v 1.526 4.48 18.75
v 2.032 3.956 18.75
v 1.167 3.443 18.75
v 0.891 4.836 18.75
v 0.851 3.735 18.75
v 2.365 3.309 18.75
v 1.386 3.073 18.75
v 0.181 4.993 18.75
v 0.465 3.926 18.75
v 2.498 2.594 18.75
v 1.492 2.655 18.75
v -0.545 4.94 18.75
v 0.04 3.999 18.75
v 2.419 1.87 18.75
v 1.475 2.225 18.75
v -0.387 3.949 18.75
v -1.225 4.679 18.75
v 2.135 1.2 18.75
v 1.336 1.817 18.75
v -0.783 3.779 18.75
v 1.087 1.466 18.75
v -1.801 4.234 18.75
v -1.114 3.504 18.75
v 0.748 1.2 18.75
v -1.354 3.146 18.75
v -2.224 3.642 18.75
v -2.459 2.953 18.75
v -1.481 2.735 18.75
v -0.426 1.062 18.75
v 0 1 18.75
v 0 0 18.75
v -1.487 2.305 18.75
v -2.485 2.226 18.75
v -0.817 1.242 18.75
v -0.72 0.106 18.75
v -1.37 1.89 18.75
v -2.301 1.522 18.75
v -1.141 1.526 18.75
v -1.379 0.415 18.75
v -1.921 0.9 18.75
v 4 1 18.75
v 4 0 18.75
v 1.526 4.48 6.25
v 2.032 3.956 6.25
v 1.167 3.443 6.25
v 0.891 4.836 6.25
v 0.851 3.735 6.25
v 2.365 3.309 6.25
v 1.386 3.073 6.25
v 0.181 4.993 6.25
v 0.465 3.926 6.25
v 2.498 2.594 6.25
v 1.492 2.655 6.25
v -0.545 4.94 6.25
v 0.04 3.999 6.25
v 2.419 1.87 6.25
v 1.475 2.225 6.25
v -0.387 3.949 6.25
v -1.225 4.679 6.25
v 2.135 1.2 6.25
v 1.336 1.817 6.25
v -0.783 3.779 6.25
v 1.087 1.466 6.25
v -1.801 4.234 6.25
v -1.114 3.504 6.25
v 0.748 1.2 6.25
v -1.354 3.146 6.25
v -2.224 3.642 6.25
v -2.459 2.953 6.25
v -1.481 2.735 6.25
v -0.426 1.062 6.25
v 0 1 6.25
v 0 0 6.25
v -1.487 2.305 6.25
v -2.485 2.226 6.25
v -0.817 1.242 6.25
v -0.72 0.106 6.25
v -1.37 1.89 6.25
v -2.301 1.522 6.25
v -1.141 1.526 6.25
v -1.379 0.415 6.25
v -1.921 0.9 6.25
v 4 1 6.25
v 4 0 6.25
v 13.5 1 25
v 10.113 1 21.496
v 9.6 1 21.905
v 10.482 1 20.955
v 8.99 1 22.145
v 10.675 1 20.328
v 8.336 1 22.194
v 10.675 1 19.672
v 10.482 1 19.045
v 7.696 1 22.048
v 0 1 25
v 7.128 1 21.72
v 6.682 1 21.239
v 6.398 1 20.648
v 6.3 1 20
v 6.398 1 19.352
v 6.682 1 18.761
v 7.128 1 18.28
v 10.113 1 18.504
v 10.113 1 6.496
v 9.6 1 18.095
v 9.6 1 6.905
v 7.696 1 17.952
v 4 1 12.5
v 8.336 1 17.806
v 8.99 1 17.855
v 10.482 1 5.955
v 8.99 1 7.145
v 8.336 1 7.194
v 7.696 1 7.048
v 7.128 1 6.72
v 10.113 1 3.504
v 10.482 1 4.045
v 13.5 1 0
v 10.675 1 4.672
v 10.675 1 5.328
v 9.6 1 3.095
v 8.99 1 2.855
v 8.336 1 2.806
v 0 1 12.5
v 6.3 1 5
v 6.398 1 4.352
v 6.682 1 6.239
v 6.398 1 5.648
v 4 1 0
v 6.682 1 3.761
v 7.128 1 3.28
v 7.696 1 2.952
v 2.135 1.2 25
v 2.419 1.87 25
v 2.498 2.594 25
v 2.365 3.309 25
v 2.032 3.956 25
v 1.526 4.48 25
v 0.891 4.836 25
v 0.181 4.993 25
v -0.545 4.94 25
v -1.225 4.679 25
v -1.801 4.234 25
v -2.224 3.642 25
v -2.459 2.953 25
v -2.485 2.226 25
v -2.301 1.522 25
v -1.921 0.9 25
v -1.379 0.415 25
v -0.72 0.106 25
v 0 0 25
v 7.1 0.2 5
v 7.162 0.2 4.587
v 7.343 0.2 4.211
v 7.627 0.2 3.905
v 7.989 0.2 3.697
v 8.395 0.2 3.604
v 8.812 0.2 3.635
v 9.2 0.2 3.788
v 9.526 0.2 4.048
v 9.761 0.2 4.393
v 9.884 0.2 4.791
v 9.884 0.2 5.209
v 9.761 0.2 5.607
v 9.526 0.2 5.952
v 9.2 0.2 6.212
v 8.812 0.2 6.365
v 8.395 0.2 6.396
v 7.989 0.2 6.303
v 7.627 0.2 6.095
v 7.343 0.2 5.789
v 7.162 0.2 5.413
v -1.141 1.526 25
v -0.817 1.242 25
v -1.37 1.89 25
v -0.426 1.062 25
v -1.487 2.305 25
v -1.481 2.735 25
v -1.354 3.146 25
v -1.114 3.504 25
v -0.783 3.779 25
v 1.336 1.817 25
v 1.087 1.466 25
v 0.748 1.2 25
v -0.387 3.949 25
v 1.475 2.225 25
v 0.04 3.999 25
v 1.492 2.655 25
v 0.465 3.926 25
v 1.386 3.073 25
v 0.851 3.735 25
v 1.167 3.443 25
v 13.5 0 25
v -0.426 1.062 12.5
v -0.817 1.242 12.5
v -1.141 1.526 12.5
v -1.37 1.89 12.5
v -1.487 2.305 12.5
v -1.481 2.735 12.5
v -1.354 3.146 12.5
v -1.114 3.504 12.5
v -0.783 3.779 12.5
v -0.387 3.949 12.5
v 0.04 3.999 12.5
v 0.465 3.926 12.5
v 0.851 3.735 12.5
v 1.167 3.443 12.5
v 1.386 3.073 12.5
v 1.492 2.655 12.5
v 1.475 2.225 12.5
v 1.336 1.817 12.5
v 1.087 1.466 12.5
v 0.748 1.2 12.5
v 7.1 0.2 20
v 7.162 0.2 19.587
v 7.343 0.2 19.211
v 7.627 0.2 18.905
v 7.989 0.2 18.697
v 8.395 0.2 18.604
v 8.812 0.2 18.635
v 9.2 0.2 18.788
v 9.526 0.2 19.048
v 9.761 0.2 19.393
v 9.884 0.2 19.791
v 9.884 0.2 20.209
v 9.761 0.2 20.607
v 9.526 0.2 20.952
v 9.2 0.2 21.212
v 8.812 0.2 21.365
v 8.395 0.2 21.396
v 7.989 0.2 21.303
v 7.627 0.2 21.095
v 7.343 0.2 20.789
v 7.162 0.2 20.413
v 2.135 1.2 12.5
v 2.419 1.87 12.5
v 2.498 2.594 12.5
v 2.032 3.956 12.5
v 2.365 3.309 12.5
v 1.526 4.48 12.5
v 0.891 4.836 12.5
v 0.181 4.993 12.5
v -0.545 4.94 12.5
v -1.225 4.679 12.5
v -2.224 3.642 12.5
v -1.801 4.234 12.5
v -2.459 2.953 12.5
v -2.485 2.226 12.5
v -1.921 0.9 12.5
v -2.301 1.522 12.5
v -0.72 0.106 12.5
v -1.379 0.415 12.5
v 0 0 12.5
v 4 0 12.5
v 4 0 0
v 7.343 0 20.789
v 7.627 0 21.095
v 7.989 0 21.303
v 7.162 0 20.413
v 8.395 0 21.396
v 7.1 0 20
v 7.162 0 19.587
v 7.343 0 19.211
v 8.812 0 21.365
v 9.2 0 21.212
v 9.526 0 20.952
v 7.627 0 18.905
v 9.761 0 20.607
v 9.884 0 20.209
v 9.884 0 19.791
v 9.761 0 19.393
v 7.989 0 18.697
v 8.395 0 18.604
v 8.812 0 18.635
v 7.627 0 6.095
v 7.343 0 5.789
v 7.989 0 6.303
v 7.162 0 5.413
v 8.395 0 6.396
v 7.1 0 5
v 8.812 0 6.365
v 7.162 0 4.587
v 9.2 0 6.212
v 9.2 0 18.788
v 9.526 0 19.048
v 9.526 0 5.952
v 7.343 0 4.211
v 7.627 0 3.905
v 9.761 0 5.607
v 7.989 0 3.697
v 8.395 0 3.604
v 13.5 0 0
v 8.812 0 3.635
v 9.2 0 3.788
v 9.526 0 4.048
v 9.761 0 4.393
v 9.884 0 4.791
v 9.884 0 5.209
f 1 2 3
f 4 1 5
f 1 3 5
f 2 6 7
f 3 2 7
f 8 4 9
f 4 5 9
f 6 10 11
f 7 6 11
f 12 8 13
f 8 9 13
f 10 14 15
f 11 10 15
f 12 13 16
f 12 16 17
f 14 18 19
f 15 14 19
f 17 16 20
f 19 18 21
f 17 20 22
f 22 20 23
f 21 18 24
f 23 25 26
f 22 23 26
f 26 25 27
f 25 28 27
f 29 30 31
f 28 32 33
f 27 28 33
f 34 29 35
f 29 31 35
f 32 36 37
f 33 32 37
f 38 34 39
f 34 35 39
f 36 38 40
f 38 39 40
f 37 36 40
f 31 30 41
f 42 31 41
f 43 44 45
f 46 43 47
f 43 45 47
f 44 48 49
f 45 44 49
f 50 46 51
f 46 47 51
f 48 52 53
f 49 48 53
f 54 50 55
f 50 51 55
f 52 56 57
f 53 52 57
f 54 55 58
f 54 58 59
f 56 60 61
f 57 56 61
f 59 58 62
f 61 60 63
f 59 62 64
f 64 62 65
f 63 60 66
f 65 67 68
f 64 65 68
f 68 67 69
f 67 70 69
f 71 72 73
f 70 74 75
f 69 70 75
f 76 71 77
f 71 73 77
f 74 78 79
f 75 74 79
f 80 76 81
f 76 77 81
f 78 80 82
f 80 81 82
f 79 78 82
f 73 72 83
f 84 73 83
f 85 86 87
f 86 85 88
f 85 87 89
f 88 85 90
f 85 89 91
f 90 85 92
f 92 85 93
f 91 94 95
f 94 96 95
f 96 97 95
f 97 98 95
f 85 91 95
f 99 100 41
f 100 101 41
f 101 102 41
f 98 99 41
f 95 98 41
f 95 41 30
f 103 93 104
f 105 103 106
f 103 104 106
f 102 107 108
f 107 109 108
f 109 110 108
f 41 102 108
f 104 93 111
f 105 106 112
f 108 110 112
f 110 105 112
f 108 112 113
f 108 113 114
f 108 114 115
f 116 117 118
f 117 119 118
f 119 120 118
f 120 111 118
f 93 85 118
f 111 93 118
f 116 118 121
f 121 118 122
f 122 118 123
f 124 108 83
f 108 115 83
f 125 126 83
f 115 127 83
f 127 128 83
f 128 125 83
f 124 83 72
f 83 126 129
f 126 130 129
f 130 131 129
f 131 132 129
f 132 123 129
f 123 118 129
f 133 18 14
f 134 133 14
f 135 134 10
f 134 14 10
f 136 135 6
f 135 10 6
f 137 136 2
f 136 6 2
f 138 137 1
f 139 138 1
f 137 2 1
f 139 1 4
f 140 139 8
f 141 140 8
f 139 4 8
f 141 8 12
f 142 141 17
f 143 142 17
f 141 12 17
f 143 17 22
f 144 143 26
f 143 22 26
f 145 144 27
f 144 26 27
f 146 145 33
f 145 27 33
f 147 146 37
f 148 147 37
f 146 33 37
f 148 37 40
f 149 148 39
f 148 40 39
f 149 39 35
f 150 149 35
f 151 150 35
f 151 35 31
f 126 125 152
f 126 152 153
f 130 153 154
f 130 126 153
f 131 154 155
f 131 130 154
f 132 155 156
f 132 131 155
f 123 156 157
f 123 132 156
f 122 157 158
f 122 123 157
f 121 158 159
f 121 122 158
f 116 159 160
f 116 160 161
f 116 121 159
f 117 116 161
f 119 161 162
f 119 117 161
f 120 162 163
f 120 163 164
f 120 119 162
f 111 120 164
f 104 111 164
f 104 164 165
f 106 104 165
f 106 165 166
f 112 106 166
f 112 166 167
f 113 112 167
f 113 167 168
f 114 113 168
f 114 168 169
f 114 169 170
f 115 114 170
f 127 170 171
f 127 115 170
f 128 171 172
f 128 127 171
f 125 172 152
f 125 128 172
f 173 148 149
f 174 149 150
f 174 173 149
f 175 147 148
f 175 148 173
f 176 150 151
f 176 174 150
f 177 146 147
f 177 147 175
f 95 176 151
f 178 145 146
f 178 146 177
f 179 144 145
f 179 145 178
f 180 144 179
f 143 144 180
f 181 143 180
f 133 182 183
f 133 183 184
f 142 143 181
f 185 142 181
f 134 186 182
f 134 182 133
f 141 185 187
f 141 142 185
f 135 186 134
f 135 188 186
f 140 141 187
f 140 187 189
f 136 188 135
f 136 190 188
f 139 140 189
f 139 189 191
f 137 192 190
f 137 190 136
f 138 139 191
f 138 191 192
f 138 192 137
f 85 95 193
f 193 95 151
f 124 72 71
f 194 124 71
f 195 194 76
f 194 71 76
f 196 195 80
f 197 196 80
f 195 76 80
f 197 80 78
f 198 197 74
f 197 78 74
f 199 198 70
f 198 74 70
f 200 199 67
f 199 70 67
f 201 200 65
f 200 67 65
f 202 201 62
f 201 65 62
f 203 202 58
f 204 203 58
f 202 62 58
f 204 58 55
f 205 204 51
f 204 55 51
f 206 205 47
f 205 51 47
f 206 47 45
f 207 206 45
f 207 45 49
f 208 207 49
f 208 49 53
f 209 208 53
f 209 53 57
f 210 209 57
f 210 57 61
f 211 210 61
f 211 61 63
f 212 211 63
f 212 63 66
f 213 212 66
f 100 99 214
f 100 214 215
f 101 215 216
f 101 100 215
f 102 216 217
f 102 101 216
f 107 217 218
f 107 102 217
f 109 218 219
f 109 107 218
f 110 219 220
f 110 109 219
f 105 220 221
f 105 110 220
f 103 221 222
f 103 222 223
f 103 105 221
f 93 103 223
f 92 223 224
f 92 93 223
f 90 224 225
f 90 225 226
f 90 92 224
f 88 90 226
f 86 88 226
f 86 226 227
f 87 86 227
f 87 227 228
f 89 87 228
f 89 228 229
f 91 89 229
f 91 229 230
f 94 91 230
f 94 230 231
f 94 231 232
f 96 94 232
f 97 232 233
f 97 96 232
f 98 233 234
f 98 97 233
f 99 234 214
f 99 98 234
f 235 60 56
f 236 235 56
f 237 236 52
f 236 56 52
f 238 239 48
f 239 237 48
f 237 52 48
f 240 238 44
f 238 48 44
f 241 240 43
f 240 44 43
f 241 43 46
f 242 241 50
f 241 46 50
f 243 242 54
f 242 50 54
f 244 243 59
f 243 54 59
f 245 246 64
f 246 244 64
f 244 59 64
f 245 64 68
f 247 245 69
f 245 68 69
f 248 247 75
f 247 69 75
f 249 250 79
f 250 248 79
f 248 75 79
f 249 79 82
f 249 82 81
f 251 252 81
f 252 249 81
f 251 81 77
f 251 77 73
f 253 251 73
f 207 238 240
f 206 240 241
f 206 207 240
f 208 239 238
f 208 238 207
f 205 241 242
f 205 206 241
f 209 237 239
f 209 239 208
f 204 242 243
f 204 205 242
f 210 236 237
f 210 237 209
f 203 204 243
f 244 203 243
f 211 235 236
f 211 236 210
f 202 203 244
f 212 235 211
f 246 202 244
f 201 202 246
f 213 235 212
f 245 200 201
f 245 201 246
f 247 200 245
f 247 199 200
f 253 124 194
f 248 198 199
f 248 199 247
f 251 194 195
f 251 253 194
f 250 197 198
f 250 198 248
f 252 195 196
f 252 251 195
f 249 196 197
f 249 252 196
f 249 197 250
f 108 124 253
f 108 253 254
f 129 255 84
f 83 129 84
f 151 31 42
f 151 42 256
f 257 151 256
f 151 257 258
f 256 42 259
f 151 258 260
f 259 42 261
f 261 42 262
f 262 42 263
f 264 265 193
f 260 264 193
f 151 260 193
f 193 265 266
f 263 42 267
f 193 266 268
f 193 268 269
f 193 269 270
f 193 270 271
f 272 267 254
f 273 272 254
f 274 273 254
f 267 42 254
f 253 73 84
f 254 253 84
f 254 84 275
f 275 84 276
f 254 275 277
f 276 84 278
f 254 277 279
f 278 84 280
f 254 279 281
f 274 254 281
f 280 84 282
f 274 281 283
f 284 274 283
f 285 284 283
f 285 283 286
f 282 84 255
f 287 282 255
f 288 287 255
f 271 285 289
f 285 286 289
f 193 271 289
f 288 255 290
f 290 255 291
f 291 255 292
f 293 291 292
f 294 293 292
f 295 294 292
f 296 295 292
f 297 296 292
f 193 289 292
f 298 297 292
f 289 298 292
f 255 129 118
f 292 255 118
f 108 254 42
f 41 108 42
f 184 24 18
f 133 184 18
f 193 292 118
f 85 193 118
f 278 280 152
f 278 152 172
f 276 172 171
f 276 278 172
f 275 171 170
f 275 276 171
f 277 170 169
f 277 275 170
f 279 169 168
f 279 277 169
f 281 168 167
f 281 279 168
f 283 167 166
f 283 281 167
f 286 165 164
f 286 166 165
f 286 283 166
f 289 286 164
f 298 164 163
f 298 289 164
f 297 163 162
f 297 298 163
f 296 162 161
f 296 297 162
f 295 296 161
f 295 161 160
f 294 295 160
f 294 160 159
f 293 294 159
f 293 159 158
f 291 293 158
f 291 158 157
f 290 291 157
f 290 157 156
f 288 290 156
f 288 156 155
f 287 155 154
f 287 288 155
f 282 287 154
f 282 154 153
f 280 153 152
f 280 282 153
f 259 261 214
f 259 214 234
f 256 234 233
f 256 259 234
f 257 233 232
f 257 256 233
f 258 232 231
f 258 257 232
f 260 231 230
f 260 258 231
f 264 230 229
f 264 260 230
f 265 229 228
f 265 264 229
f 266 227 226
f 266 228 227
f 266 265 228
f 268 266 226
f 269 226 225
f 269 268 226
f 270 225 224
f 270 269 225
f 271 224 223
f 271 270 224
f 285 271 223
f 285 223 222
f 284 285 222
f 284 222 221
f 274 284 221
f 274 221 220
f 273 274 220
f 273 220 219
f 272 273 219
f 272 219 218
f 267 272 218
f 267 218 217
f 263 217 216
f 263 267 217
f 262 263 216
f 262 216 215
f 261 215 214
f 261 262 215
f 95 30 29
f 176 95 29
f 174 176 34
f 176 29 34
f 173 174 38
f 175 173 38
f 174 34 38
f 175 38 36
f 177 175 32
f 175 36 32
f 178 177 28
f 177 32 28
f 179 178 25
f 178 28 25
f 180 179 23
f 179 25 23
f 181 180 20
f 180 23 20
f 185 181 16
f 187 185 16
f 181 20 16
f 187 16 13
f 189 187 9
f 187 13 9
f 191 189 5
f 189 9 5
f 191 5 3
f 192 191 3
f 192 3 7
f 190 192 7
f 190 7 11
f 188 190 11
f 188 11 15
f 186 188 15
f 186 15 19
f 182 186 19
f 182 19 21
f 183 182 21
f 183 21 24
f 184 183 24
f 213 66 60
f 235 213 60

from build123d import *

# Parameters (mm, degrees)
EXTRUDE_1_DEPTH          = 25
CUT_EXTRUDE_1_DEPTH      = 25
CUT_EXTRUDE_1_DEPTH_BACK = 25
SKETCH_2_R               = 1.4
SKETCH_2_W               = 8.931793576
SKETCH_2_H               = 6.25
SKETCH_2_H_2             = 7.571808546
CHAMFER_1_SIZE           = 0.8


with BuildPart() as part:
    # Эскиз1 → Вытянуть1 (new body)
    with BuildSketch(Plane.XY):
        with BuildLine():
            Line((0, 0), (13.5, 0))
            Line((13.5, 0), (13.5, 1))
            Line((13.5, 1), (0, 1))
            ThreePointArc((0, 1), (-0.387298335, 3.949137675), (0.748331477, 1.2))
            Line((0.748331477, 1.2), (2.13541565, 1.2))
            ThreePointArc((2.13541565, 1.2), (-1.224744871, 4.679449472), (0, 0))
        make_face()
    extrude(amount=EXTRUDE_1_DEPTH)

    # Эскиз2 → Вырез-Вытянуть1 (cut, two sides: drawn at the far end of the back side and taken through both)
    with BuildSketch(Plane(origin=(0, 1, 0), x_dir=(-1, 0, 0), z_dir=(0, 1, 0)).offset(-CUT_EXTRUDE_1_DEPTH_BACK)):
        with Locations((-8.5, 20)):
            Circle(SKETCH_2_R)
        with Locations((-8.5, 5)):
            Circle(SKETCH_2_R)
        with Locations((0.465896788, 15.625)):
            Rectangle(SKETCH_2_W, SKETCH_2_H)
        with Locations((0.465896788, 2.464095727)):
            Rectangle(SKETCH_2_W, SKETCH_2_H_2)
    extrude(amount=CUT_EXTRUDE_1_DEPTH + CUT_EXTRUDE_1_DEPTH_BACK, mode=Mode.SUBTRACT)

    # Фаска1
    chamfer_1_edges = [part.edges().sort_by_distance(p)[0] for p in [
        (9.9, 1, 20),
        (9.9, 1, 5),
    ]]
    chamfer(chamfer_1_edges, length=CHAMFER_1_SIZE)


solid = part.part
